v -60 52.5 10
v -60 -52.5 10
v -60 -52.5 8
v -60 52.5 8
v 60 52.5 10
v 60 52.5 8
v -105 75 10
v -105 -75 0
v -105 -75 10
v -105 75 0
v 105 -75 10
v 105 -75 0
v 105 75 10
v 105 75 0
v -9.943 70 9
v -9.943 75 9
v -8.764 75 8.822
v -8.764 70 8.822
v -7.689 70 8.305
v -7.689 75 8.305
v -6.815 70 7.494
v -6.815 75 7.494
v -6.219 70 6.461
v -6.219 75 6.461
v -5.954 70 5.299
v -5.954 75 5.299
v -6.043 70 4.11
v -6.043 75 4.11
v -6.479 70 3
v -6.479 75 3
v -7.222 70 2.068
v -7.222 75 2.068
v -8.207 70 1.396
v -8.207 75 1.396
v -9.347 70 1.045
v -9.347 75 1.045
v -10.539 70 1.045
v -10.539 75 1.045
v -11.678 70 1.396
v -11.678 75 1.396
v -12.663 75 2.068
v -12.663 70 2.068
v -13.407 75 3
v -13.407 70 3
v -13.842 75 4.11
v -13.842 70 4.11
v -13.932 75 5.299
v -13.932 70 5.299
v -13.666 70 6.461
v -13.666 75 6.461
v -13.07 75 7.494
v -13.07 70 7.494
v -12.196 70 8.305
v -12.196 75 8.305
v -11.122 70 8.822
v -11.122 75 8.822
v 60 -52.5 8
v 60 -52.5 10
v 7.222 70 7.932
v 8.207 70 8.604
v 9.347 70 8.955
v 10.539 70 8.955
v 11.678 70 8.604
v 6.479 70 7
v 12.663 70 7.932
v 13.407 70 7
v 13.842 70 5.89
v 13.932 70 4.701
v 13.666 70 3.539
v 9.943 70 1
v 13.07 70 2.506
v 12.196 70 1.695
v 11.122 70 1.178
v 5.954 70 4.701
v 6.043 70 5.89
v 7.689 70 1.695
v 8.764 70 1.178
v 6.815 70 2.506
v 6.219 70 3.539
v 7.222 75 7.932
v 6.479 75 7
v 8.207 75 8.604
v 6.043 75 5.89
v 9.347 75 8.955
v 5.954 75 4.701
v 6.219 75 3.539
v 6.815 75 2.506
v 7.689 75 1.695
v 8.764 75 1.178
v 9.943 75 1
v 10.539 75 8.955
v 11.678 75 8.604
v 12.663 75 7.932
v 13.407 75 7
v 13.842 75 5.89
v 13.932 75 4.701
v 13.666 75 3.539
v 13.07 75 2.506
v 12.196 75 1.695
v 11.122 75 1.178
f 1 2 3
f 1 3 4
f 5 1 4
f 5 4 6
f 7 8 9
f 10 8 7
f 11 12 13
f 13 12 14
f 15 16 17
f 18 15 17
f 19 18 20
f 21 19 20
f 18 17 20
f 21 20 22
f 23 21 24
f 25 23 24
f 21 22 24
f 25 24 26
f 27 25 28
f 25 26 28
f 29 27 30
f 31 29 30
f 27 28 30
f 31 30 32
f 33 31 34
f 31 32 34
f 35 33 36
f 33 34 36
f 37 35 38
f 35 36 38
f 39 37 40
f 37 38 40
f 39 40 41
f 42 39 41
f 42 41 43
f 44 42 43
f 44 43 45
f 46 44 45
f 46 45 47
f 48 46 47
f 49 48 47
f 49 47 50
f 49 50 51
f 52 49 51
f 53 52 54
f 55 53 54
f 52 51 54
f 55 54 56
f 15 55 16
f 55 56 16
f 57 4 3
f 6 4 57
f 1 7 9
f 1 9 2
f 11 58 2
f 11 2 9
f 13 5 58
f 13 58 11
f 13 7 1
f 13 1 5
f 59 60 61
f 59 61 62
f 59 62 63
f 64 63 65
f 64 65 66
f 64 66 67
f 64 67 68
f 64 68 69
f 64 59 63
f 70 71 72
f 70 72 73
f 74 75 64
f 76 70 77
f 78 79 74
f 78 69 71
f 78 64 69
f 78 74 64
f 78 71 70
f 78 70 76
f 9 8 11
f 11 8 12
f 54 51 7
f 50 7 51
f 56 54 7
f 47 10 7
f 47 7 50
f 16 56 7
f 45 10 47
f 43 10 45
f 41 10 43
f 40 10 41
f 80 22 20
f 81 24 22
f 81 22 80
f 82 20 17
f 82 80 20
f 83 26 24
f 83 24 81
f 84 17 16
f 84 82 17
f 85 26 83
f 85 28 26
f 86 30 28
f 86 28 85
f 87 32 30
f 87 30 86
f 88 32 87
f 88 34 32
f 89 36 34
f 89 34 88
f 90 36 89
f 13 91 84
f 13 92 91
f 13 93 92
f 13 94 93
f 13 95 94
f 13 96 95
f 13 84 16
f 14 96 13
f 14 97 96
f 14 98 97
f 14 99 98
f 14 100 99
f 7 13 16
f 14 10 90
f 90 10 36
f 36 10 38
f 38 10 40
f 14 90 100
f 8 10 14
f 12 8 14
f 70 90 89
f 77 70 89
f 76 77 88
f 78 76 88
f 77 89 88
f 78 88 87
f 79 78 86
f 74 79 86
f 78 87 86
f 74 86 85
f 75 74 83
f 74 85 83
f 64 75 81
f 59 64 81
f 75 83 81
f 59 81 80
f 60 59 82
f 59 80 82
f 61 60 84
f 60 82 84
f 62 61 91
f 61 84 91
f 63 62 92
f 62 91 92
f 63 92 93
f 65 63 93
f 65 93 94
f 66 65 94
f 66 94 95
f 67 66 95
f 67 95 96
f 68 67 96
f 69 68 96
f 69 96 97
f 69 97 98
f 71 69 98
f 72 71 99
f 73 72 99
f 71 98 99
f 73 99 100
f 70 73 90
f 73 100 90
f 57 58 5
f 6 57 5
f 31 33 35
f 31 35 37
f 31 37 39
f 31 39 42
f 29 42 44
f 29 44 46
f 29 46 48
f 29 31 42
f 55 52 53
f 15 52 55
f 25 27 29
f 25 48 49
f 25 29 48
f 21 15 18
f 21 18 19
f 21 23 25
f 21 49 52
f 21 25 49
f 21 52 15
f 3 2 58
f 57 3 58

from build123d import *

# Parameters (mm, degrees)
SKETCH1_W           = 210
SKETCH1_H           = 150
BOSS_EXTRUDE1_DEPTH = 10
SKETCH2_W           = 120
SKETCH2_H           = 105
CUT_EXTRUDE1_DEPTH  = 2
SKETCH3_R           = 4
CUT_EXTRUDE2_DEPTH  = 5


with BuildPart() as part:
    # Sketch1 → Boss-Extrude1 (new body)
    with BuildSketch(Plane.XY):
        Rectangle(SKETCH1_W, SKETCH1_H)
    extrude(amount=BOSS_EXTRUDE1_DEPTH)

    # Sketch2 → Cut-Extrude1 (cut)
    with BuildSketch(Plane.XY.offset(10)):
        Rectangle(SKETCH2_W, SKETCH2_H)
    extrude(amount=-CUT_EXTRUDE1_DEPTH, mode=Mode.SUBTRACT)

    # Sketch3 → Cut-Extrude2 (cut)
    with BuildSketch(Plane(origin=(0, 75, 0), x_dir=(1, 0, 0), z_dir=(0, 1, 0))):
        with Locations(Location((-9.942757001, -5, 0), (0, 0, 270))):
            Circle(SKETCH3_R)
        with Locations(Location((9.942757001, -5, 0), (0, 0, 90))):
            Circle(SKETCH3_R)
    extrude(amount=-CUT_EXTRUDE2_DEPTH, mode=Mode.SUBTRACT)


solid = part.part
